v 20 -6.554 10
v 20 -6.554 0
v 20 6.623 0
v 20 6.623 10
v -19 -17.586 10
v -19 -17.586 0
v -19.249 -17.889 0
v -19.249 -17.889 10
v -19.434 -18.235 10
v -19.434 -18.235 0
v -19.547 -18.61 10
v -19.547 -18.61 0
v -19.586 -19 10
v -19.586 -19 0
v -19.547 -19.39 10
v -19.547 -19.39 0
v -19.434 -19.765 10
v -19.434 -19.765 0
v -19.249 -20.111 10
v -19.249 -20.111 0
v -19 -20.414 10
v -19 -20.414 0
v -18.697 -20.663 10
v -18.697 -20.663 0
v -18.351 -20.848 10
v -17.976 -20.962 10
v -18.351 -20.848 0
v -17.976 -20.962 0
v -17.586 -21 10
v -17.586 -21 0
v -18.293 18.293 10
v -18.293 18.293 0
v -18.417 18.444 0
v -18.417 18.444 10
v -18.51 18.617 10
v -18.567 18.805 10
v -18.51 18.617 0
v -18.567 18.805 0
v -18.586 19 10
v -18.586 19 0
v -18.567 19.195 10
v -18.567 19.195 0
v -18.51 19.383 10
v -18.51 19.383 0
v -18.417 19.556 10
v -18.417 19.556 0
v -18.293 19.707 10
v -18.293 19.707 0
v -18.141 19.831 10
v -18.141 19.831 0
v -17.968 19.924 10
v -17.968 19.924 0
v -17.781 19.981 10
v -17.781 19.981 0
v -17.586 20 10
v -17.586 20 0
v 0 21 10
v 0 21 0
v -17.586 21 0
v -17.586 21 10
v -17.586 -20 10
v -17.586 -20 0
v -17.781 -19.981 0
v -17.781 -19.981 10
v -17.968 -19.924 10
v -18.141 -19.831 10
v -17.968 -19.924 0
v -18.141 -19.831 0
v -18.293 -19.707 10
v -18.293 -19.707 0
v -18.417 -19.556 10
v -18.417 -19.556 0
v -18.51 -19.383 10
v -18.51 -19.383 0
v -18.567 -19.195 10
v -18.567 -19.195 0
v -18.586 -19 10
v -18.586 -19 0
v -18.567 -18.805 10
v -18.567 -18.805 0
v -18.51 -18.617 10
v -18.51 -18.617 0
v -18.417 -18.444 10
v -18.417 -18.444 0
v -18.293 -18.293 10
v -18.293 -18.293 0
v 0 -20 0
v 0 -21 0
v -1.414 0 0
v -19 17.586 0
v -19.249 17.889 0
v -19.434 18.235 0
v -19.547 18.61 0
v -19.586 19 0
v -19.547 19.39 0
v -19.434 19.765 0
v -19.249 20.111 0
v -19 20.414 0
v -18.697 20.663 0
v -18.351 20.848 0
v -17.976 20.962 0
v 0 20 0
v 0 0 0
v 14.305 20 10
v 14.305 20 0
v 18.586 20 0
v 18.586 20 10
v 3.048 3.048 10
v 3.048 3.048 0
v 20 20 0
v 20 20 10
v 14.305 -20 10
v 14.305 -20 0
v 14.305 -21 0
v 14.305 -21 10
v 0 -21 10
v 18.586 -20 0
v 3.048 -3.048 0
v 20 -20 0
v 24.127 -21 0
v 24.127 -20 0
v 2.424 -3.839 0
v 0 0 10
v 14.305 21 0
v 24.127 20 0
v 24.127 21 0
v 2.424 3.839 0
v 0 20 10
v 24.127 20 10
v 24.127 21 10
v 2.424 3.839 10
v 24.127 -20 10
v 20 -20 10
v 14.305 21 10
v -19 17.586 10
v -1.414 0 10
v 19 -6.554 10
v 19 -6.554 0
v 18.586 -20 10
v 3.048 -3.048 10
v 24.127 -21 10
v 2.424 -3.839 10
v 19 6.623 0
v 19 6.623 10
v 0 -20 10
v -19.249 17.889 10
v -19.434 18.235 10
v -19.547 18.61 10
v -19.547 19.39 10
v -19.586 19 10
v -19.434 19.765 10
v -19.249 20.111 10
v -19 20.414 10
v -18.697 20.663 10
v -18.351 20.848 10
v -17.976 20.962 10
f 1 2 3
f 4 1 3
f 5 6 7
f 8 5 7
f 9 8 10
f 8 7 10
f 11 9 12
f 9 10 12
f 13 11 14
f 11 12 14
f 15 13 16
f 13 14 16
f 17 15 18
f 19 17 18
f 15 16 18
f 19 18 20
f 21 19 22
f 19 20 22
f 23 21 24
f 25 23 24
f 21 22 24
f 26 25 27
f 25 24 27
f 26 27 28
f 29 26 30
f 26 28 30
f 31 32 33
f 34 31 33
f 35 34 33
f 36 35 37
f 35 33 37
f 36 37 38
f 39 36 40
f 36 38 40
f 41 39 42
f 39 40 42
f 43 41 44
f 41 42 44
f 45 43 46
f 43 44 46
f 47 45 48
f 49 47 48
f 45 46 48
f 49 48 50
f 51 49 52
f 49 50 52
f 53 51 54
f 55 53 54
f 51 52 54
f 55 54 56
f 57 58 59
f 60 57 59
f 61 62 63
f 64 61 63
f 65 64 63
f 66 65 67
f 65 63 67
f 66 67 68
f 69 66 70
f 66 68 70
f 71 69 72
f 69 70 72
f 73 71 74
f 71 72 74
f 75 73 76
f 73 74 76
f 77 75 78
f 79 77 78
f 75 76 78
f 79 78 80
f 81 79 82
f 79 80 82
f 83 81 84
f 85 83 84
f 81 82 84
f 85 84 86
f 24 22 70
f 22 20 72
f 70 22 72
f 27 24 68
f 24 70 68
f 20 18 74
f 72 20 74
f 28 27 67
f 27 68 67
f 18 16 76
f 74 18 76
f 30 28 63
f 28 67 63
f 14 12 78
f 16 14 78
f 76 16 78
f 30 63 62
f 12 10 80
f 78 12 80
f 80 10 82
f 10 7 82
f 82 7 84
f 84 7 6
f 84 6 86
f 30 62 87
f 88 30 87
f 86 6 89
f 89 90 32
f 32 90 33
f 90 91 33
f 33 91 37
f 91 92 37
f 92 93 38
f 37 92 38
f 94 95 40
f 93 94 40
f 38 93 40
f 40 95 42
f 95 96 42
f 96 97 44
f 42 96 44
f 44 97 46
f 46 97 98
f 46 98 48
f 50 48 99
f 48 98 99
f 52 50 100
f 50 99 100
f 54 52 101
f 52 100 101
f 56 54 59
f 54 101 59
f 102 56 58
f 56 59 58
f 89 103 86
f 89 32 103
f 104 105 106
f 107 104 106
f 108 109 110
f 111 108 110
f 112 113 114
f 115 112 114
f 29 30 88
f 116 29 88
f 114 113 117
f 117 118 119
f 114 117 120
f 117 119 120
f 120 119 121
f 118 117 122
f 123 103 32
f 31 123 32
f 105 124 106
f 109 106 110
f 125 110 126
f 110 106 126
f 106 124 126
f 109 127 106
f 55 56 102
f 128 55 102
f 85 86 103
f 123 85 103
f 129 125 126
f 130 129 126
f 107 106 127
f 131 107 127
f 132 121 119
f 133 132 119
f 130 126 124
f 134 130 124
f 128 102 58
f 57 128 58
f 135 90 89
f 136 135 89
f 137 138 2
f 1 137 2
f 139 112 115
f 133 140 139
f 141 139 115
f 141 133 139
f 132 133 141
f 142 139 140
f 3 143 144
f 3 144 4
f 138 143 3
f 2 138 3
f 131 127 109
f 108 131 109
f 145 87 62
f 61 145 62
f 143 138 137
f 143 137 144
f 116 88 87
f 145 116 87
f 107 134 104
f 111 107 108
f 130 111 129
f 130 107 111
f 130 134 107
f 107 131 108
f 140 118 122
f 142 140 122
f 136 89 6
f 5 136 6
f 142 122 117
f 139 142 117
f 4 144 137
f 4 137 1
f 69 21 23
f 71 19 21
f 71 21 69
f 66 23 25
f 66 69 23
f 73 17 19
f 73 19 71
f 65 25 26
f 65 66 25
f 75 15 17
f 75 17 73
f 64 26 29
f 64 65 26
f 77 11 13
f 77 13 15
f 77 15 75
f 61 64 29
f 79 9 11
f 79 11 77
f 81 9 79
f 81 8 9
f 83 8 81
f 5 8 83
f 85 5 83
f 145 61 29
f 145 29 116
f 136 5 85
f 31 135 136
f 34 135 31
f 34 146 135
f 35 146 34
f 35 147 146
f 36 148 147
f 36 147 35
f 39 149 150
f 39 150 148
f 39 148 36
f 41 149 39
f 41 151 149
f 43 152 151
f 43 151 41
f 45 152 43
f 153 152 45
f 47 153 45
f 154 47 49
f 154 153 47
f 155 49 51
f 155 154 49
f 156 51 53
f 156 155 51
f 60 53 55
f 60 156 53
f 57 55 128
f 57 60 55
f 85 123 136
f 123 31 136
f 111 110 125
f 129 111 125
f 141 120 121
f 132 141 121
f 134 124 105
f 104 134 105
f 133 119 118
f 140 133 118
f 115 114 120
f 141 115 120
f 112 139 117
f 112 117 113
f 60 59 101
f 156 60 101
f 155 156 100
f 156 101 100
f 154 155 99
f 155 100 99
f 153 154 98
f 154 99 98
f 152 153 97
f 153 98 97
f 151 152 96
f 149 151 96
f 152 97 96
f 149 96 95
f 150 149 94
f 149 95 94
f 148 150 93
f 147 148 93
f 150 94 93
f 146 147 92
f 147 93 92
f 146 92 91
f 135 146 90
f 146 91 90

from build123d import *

# Parameters (mm, degrees)
F0_W     = 1
F0_H     = 13.177095
F1_DEPTH = 10


with BuildPart() as f1:
    # F0 (on Top) → F1 (new body)
    with BuildSketch(Plane.XY):
        with Locations((19.5, 0.034397)):
            Rectangle(F0_W, F0_H)
        with BuildLine():
            ThreePointArc((-17.585786, -20), (-18.509666, -19.382683), (-18.292893, -18.292893))
            Line((-18.292893, -18.292893), (0, 0))
            Line((0, 0), (-18.292893, 18.292893))
            ThreePointArc((-18.292893, 18.292893), (-18.509666, 19.382683), (-17.585786, 20))
            Line((-17.585786, 20), (0, 20))
            Line((0, 20), (0, 21))
            Line((0, 21), (-17.585786, 21))
            ThreePointArc((-17.585786, 21), (-19.433546, 19.765367), (-19, 17.585786))
            Line((-19, 17.585786), (-1.414214, 0))
            Line((-1.414214, 0), (-19, -17.585786))
            ThreePointArc((-19, -17.585786), (-19.433546, -19.765367), (-17.585786, -21))
            Line((-17.585786, -21), (0, -21))
            Line((0, -21), (0, -20))
            Line((0, -20), (-17.585786, -20))
        make_face()
        Polygon((2.424336, 3.838549), (3.048253, 3.048253), (20, 20), (24.126568, 20), (24.126568, 21), (19.585786, 21), (14.304577, 21), (14.304577, 20), (18.585786, 20), align=None)
        Polygon((20, -20), (3.048253, -3.048253), (2.424336, -3.838549), (18.585786, -20), (14.304577, -20), (14.304577, -21), (19.585786, -21), (24.126568, -21), (24.126568, -20), align=None)
    extrude(amount=F1_DEPTH)


solid = f1.part
